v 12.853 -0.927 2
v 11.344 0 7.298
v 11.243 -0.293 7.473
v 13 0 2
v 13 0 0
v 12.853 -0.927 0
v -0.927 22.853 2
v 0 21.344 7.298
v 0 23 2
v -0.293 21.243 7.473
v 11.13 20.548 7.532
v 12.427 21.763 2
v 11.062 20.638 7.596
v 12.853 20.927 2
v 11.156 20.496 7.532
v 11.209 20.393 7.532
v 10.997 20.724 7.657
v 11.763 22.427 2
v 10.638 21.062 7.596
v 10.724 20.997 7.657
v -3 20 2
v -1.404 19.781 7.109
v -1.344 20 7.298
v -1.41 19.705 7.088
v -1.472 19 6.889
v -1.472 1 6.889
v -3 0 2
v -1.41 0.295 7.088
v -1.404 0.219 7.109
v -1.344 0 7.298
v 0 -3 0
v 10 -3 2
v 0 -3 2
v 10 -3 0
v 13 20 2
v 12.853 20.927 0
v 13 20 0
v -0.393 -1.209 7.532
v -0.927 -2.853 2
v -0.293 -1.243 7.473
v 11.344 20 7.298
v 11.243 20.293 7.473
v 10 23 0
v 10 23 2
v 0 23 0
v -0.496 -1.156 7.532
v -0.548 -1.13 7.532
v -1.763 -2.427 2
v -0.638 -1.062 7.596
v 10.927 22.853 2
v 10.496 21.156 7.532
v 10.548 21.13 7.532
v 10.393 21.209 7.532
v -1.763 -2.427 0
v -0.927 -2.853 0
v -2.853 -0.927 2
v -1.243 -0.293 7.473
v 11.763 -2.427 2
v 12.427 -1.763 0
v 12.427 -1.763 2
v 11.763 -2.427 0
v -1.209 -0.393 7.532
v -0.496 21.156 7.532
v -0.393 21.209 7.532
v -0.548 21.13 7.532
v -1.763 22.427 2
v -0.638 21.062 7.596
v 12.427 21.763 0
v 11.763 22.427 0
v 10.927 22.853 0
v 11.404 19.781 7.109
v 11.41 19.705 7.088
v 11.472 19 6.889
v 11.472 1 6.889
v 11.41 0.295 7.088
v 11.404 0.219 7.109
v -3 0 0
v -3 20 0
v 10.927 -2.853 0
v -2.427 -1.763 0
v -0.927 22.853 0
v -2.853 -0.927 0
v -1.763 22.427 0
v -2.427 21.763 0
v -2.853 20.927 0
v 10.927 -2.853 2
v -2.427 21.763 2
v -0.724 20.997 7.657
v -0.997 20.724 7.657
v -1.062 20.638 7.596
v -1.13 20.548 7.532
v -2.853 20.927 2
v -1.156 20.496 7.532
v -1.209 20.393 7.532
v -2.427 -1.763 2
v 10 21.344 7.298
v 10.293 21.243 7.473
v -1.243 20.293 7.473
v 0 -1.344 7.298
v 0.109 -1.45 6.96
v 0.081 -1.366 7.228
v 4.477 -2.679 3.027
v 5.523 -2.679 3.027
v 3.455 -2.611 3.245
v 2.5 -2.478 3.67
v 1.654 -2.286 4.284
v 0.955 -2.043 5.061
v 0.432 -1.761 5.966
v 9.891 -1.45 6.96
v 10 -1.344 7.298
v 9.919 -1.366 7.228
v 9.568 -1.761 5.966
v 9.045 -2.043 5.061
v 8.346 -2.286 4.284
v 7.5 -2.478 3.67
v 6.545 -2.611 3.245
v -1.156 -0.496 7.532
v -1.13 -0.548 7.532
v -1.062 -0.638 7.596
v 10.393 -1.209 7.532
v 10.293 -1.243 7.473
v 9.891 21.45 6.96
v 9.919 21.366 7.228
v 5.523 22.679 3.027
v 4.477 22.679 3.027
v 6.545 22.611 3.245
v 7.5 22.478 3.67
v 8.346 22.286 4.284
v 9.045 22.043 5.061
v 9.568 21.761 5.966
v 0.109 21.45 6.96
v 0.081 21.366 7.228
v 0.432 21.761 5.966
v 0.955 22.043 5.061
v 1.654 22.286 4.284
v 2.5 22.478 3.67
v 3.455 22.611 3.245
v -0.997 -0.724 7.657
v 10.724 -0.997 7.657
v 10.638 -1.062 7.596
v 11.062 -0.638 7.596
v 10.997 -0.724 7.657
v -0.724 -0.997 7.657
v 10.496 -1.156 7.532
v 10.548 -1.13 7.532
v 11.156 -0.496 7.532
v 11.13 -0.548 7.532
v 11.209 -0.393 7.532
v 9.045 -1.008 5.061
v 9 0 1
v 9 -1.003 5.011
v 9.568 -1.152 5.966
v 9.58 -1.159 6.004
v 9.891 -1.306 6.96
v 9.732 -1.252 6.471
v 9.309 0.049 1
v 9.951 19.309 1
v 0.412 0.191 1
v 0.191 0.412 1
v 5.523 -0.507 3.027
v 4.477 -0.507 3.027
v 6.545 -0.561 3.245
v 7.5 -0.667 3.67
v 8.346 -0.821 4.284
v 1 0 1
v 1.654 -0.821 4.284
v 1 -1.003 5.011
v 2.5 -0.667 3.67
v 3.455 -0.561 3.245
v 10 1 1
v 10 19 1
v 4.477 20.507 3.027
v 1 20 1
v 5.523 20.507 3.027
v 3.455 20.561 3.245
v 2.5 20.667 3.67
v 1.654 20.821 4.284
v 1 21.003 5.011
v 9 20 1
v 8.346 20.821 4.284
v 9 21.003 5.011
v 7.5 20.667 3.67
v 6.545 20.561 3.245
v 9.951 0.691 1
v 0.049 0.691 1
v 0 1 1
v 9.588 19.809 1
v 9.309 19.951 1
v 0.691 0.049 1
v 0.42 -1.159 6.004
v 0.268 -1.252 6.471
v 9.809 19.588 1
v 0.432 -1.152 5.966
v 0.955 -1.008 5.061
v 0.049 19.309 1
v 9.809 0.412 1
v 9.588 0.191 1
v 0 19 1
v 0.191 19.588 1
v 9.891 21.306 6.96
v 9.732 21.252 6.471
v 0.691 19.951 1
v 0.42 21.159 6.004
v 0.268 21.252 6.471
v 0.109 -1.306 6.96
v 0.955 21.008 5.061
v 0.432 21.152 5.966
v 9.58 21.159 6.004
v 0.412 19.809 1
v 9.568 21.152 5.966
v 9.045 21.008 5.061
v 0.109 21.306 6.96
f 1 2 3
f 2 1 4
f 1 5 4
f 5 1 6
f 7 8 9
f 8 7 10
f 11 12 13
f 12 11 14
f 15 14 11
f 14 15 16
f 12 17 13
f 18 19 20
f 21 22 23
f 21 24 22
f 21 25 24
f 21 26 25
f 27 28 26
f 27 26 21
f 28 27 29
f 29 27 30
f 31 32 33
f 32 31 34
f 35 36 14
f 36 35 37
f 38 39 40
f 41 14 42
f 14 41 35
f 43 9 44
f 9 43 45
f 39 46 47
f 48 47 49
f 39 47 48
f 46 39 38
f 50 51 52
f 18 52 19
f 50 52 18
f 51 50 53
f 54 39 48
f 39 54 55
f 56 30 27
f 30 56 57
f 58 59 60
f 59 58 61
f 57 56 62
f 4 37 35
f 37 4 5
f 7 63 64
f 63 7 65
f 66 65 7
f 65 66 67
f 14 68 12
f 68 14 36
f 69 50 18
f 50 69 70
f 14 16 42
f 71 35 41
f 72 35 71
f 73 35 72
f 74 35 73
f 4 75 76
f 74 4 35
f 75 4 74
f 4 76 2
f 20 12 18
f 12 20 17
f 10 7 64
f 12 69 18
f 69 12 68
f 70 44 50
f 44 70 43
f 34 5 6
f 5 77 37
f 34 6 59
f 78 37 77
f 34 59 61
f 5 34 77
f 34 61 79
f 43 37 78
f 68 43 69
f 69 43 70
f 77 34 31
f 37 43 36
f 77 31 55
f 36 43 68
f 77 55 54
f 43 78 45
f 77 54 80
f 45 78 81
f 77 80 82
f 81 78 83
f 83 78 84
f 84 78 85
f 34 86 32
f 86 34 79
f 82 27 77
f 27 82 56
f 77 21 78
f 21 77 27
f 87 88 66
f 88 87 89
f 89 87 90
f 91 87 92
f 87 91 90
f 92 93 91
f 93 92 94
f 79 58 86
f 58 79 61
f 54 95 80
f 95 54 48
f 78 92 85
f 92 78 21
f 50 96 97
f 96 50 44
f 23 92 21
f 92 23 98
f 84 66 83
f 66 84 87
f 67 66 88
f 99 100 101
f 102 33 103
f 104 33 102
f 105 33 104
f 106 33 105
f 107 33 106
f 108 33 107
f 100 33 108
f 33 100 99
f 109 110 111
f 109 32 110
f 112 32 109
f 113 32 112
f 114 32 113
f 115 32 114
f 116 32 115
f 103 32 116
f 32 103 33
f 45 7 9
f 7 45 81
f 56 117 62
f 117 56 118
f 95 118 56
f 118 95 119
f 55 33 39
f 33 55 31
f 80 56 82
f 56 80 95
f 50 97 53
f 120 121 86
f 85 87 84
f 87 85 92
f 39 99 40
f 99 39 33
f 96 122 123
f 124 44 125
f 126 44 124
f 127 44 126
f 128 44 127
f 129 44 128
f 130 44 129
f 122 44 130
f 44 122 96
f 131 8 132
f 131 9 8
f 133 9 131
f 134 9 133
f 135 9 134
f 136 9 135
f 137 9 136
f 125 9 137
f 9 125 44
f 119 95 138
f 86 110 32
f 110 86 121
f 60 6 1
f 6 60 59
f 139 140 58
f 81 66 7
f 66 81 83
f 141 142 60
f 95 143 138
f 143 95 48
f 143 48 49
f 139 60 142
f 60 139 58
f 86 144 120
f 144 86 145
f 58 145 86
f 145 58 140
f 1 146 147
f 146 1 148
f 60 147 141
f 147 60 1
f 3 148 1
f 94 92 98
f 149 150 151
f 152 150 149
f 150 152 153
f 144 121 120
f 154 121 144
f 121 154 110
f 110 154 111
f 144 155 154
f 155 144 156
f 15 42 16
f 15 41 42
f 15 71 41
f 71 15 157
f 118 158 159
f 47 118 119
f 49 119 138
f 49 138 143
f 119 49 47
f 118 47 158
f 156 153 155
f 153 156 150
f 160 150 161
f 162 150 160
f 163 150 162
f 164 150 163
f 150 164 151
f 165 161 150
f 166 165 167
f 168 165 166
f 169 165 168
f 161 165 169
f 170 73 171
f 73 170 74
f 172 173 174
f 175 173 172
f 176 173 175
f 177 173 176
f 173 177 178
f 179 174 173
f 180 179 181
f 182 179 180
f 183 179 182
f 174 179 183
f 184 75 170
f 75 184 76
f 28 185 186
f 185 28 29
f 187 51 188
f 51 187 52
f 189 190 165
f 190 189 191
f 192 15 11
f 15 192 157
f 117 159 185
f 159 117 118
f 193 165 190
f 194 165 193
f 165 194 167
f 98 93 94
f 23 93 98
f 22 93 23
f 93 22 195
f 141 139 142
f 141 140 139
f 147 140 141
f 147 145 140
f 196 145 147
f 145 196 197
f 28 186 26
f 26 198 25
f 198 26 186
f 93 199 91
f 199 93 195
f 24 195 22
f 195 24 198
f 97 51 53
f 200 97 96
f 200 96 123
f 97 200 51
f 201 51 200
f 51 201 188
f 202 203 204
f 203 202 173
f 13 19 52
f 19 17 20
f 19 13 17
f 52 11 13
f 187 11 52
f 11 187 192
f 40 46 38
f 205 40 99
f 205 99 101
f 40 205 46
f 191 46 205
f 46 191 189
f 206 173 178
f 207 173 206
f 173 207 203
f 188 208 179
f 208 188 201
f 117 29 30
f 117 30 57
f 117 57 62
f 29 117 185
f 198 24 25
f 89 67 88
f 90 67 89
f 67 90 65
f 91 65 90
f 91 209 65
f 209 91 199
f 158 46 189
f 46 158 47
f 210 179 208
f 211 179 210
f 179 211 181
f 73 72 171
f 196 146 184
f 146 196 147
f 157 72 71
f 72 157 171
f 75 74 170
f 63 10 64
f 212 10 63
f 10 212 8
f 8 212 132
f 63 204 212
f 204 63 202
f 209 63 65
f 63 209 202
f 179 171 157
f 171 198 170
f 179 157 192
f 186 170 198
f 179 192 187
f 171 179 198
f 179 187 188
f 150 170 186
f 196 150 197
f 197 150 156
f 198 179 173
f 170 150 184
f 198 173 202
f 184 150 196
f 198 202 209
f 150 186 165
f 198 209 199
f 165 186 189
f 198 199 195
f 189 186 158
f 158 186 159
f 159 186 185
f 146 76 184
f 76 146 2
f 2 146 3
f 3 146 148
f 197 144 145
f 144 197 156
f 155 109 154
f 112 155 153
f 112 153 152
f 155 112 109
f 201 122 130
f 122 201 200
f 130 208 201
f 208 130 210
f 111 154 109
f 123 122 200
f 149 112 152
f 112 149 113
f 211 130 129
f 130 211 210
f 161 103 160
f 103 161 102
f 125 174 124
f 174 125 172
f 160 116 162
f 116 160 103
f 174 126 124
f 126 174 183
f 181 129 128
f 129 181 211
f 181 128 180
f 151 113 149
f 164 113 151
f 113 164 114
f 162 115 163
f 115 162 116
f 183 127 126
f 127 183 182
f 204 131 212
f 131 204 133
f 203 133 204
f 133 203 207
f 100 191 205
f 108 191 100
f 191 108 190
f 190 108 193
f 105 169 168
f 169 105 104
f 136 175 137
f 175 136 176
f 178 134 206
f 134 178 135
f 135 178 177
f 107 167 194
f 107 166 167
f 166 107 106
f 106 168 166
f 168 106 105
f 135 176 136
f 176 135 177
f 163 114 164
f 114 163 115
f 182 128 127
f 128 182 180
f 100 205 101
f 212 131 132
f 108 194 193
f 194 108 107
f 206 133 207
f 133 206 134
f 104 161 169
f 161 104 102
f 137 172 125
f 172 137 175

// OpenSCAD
$fn=20;
difference(){
difference(){
minkowski(){
cube([10,20,2]);
cylinder(8,d1=6,d2=1);
}
translate([1,1,1]){

minkowski(){
cube([8,18,2]);
cylinder(8,d1=2,d2=6);
}
}
}

translate([5,-3,8]){
rotate([270,0,0]){
    $fn=30;
    
cylinder(32,d=10);
}}

}
